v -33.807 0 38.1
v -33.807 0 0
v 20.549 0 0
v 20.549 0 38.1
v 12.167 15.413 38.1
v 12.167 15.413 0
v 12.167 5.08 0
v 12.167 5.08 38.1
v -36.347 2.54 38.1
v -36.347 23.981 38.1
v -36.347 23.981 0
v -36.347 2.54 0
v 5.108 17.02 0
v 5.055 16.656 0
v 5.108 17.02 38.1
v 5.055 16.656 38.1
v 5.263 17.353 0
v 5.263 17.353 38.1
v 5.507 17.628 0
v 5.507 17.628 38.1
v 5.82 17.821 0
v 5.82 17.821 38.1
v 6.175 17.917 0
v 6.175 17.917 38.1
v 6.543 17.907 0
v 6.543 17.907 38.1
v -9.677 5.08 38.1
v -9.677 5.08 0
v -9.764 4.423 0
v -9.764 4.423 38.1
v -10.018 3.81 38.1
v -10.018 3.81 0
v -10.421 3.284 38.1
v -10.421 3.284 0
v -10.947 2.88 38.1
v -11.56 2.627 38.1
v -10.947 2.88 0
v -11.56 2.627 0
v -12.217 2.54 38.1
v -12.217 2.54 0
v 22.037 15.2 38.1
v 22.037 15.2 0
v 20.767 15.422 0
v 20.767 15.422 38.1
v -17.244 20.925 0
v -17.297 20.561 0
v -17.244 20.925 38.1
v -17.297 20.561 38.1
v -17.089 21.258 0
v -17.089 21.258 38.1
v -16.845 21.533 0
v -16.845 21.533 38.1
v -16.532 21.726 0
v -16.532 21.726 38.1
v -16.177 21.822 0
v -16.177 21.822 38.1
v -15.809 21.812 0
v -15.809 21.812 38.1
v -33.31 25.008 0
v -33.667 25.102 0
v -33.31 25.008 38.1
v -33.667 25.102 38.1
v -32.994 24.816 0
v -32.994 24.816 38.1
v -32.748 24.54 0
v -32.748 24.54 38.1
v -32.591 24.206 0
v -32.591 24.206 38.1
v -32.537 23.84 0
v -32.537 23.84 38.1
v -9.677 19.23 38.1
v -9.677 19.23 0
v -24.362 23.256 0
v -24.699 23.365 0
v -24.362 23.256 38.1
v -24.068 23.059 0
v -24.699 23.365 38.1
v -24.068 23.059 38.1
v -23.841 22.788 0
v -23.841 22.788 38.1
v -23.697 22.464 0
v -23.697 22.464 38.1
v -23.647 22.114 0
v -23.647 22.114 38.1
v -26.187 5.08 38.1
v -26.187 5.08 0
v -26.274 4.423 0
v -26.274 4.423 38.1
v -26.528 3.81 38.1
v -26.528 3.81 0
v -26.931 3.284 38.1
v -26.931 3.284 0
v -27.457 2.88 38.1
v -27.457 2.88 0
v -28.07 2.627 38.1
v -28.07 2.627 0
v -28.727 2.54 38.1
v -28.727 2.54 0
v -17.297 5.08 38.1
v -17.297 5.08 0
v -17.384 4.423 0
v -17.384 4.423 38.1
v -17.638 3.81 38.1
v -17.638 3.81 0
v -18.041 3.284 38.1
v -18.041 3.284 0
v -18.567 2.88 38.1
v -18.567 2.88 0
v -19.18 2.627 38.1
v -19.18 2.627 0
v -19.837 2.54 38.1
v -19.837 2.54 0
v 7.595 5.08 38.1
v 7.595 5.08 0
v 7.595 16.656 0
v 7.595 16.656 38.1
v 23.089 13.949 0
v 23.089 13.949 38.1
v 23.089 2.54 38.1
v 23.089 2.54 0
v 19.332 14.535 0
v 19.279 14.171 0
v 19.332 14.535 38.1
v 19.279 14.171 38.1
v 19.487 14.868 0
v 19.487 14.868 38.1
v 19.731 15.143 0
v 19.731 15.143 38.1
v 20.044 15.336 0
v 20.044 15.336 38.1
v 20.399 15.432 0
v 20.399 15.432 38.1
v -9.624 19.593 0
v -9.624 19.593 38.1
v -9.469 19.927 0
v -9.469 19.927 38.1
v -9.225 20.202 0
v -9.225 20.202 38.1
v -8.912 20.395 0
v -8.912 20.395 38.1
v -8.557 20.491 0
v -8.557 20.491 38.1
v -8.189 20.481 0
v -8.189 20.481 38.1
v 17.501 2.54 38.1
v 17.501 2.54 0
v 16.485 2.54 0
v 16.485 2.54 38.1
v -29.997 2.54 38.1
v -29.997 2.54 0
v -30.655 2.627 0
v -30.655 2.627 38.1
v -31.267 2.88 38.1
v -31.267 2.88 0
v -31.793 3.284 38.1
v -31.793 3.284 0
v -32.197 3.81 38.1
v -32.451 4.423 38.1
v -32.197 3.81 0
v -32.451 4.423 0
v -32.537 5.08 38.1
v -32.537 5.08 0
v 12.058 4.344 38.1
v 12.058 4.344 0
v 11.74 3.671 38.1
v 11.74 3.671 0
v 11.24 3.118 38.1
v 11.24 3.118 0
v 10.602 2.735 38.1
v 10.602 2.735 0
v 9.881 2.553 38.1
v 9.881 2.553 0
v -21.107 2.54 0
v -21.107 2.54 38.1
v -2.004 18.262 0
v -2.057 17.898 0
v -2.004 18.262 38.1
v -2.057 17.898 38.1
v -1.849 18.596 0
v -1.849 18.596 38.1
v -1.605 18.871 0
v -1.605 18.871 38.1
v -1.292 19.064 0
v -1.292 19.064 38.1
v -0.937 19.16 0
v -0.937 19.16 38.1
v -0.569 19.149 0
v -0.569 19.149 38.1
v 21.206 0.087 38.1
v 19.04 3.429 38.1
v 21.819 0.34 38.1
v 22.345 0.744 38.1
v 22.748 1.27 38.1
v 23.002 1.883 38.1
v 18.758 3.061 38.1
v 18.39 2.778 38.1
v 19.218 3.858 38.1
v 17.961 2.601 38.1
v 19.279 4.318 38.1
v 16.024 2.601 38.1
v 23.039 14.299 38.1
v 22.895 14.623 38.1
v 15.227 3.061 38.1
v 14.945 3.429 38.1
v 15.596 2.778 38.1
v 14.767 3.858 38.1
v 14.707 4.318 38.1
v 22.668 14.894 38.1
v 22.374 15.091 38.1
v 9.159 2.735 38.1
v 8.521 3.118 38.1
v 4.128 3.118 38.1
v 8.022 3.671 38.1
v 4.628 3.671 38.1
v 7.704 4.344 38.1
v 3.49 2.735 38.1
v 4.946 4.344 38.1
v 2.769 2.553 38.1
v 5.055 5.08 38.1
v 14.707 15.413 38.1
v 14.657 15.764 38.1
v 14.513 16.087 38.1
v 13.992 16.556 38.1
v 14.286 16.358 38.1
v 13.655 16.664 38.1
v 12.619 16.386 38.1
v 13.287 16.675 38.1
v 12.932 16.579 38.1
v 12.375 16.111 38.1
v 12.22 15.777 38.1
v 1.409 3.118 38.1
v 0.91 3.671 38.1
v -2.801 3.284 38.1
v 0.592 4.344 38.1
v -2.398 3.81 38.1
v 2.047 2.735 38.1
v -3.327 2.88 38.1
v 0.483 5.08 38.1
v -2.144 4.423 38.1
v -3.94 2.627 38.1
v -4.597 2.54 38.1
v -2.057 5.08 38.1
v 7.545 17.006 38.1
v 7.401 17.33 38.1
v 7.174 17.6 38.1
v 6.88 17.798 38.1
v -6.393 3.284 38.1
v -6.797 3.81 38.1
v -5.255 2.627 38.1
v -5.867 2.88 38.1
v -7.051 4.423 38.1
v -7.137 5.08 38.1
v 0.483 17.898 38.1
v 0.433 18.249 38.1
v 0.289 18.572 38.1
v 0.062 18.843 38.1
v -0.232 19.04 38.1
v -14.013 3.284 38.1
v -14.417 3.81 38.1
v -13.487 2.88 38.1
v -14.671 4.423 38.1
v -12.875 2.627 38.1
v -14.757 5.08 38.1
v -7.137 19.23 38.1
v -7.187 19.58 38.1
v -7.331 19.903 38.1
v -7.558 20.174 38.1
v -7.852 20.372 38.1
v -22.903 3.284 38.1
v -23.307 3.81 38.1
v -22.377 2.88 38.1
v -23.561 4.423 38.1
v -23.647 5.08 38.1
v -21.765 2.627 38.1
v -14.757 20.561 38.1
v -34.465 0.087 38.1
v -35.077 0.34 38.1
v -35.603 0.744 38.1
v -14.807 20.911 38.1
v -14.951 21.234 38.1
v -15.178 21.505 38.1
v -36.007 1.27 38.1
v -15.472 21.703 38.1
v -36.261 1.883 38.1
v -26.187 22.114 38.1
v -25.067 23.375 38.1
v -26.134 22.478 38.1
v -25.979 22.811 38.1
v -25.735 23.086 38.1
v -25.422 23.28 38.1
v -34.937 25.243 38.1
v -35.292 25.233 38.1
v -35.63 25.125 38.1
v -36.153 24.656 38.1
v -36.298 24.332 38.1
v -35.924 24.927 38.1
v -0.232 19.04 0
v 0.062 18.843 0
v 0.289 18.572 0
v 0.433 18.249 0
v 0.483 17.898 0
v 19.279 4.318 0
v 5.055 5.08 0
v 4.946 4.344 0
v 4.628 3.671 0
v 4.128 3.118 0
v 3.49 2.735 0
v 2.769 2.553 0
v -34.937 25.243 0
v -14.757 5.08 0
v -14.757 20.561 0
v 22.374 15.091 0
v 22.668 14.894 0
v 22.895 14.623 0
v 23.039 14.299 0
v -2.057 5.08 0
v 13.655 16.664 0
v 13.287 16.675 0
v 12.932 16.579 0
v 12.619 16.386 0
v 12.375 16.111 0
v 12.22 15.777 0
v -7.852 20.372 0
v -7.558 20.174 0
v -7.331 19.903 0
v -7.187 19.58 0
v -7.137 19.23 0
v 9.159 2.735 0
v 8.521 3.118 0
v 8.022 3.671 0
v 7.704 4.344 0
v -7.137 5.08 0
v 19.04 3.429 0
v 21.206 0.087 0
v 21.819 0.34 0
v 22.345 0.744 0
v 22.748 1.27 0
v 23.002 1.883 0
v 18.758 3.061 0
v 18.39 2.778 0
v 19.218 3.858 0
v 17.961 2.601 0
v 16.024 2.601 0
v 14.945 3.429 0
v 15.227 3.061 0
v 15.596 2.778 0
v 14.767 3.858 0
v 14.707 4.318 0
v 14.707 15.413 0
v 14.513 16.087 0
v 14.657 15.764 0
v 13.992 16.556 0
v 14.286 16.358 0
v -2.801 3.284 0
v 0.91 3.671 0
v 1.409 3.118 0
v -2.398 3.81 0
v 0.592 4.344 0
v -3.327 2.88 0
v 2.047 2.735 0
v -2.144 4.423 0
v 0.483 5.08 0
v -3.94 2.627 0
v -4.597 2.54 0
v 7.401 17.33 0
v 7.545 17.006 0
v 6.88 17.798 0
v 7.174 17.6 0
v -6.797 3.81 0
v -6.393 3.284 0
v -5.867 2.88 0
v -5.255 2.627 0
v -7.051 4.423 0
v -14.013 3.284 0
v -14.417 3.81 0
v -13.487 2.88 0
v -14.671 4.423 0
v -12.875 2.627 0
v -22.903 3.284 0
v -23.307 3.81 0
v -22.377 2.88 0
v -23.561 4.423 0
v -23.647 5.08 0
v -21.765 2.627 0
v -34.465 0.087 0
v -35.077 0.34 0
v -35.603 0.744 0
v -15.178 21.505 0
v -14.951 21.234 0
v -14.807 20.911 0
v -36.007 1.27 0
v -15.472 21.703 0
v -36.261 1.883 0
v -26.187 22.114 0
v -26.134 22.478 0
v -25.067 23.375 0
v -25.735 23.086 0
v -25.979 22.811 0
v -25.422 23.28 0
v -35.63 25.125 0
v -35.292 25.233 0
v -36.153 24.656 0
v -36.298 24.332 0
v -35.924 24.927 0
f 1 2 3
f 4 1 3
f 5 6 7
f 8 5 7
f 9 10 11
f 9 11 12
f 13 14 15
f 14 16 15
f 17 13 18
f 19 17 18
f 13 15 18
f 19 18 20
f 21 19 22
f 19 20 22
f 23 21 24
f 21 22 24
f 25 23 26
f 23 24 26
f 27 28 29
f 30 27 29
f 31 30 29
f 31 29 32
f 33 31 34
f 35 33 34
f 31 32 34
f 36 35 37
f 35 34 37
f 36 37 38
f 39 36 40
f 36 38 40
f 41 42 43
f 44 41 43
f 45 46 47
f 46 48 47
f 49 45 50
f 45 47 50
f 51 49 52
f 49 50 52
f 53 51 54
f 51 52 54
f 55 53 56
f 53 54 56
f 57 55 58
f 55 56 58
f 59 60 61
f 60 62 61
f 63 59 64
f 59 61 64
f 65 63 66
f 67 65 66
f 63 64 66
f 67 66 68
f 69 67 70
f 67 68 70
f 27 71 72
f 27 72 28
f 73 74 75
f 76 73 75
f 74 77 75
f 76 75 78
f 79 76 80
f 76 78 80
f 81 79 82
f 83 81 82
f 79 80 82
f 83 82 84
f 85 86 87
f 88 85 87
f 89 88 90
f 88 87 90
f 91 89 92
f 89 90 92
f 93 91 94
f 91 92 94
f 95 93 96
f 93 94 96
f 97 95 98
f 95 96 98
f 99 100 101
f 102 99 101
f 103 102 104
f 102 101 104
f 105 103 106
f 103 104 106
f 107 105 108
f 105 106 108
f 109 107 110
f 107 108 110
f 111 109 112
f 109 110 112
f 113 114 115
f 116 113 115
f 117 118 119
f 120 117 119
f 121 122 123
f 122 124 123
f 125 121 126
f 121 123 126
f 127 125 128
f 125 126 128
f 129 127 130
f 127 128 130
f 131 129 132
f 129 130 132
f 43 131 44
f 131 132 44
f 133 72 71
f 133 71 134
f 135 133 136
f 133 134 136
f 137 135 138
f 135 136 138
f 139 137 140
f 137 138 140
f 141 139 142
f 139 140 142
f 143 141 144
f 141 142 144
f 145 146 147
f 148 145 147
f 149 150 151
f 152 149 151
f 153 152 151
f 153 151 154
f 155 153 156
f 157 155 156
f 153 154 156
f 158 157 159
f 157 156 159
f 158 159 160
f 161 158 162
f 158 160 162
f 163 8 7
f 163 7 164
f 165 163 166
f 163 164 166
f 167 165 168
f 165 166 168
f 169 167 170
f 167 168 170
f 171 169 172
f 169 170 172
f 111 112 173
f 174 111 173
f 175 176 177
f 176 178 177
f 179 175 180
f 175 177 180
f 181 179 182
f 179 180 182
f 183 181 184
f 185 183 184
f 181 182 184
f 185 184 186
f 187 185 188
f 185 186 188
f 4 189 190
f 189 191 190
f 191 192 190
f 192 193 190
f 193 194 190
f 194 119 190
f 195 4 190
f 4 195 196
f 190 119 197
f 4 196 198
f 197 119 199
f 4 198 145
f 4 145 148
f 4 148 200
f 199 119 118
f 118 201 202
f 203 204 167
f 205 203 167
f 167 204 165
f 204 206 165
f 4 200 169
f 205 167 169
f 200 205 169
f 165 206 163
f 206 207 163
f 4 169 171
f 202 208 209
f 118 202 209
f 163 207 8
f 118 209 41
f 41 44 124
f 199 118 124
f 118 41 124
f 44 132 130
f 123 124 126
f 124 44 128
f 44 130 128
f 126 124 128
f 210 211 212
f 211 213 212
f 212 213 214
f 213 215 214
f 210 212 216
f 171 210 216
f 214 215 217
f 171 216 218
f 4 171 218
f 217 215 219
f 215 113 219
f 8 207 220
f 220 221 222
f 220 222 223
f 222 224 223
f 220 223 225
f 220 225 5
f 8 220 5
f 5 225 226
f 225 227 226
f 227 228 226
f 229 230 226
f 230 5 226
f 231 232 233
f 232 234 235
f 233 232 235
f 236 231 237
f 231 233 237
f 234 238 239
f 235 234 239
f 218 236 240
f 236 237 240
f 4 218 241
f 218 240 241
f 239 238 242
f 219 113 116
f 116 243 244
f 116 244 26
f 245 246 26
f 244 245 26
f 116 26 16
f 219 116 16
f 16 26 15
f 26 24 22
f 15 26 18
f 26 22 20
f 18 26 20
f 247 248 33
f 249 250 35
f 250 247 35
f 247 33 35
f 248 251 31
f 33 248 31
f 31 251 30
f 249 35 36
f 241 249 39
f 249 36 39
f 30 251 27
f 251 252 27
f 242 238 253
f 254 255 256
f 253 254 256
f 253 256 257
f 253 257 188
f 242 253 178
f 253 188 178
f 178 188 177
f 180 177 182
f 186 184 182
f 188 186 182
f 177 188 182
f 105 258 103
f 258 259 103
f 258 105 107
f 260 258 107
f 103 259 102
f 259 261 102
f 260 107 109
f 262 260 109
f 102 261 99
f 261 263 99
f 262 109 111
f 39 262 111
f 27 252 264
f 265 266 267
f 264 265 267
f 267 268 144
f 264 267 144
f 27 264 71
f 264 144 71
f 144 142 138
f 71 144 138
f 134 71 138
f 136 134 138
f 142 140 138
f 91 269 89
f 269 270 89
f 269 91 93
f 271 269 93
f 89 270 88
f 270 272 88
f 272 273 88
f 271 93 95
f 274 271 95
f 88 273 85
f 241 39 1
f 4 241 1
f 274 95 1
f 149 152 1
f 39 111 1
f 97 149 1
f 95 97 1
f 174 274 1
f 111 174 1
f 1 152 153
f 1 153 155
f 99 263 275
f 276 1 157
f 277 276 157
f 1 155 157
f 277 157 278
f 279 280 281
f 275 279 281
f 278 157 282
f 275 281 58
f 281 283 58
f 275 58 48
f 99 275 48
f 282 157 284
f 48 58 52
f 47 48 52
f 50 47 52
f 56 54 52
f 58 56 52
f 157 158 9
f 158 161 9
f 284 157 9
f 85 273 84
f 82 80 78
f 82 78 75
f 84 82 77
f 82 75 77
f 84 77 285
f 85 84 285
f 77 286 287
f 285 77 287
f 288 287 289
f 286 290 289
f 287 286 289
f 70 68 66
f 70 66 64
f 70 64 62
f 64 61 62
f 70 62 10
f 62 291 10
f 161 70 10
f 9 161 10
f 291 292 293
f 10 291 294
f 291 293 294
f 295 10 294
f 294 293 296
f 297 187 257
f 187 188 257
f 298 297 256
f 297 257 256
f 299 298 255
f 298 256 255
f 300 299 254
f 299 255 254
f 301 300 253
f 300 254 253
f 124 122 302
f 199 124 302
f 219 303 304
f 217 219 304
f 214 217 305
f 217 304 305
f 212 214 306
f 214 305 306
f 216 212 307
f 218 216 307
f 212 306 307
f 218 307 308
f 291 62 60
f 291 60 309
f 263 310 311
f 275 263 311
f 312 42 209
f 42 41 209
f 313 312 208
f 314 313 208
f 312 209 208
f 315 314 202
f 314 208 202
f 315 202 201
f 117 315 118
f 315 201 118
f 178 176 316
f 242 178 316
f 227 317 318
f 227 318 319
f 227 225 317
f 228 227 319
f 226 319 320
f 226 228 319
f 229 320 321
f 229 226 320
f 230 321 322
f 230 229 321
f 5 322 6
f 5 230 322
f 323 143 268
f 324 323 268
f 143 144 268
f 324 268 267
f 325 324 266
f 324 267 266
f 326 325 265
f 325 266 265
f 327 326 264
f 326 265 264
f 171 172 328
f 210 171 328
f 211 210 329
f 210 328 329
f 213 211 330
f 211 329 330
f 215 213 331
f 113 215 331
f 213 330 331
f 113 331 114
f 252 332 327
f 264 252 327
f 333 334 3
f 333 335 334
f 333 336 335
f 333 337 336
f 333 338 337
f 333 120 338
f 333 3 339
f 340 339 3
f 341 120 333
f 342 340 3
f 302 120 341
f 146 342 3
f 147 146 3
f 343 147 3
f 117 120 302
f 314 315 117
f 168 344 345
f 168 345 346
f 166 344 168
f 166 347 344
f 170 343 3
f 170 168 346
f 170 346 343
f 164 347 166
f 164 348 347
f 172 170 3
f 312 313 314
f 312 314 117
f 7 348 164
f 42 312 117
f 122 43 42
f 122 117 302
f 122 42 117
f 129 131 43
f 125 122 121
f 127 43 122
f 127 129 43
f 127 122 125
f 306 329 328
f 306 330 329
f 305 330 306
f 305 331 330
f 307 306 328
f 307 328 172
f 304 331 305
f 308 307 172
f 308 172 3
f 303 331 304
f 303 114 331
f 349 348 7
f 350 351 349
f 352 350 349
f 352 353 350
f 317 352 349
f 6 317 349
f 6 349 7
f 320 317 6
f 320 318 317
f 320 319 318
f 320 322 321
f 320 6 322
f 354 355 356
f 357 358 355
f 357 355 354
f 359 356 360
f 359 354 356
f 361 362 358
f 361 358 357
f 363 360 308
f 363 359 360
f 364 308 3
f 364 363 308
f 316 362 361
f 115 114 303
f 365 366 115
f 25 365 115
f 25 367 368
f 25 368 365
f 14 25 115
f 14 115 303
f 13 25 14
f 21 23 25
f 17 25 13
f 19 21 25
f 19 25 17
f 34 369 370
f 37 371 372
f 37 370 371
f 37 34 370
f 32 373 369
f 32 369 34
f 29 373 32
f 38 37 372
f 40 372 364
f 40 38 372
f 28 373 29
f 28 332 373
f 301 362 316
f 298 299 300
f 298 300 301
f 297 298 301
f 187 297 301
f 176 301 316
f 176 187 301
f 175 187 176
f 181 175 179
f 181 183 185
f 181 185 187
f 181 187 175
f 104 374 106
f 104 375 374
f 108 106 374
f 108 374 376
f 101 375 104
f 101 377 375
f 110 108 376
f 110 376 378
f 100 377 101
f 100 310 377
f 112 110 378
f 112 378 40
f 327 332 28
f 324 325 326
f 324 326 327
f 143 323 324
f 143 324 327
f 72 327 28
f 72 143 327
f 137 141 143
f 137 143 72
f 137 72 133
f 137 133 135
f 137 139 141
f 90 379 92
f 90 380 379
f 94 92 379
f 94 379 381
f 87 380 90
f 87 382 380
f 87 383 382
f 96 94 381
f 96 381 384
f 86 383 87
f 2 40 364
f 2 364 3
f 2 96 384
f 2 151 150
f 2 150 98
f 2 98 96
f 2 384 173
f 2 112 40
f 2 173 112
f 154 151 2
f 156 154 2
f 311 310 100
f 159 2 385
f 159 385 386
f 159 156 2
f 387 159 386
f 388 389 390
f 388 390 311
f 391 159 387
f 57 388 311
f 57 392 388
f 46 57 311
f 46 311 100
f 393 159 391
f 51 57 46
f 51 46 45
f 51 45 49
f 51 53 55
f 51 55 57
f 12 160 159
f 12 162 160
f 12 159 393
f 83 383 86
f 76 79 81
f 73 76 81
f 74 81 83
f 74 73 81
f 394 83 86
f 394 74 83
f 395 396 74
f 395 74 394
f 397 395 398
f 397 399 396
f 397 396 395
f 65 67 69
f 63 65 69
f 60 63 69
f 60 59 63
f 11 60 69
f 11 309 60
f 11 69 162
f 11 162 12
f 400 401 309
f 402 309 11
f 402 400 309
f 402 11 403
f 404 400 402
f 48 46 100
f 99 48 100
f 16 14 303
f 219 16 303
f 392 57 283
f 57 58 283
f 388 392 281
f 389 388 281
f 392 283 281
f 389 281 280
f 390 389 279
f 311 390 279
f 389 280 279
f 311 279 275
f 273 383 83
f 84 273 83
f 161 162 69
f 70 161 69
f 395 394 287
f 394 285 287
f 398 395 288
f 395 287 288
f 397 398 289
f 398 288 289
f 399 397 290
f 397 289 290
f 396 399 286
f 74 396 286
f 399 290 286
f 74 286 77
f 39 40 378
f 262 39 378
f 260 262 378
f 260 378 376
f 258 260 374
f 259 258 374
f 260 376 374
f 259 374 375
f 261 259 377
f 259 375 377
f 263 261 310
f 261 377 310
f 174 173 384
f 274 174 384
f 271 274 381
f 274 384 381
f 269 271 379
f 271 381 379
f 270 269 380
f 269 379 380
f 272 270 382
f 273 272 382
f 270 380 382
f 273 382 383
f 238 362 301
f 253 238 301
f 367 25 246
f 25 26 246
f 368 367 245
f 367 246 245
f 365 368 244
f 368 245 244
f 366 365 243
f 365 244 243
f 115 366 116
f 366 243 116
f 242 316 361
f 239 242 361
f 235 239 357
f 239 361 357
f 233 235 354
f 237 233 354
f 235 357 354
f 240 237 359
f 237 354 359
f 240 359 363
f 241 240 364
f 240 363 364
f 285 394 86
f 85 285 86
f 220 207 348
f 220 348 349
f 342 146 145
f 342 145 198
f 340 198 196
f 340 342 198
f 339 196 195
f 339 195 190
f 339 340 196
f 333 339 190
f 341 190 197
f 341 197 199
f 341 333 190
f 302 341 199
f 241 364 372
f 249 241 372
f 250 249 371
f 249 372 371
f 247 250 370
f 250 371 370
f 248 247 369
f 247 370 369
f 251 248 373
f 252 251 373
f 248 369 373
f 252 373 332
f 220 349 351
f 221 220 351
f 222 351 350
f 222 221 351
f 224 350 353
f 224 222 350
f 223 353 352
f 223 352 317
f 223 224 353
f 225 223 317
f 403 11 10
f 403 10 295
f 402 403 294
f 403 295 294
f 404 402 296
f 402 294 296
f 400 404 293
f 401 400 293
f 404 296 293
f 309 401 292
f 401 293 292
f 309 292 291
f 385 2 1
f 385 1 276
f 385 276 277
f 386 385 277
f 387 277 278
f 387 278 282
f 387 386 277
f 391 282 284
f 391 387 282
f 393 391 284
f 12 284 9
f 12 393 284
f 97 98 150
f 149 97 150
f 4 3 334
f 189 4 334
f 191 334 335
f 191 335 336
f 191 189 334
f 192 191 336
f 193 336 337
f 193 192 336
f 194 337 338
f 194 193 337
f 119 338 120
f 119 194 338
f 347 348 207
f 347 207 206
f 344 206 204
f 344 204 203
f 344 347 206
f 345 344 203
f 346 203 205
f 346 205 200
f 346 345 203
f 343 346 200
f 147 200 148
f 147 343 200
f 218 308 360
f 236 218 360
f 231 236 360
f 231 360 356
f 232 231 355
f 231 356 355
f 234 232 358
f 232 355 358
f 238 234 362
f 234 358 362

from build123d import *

# Parameters (mm, degrees)
F1_DEPTH    = 38.1
F2_T1_DEPTH = 38.1
F2_T3_DEPTH = 50.8
F3_T1_DEPTH = 38.1
F4_R        = 1.26999
F5_W        = 23.6700927116
F5_H        = 11.2887102096
F6_DEPTH    = 38.101
F7_R        = 2.54


# Not quite as in the source:
# - a fillet or chamfer that OpenCascade refuses, or shapes differently, is made with other operations: its cross-section is extruded or revolved along the edge and cut away or added
# - a fillet or chamfer is up to 0.001 mm smaller than in the source, because OpenCascade refuses the exact size


with BuildPart() as f1:
    # F0 (on Top) → F1 (new body)
    with BuildSketch(Plane.XY):
        Polygon((-36.3474, 25.4), (-36.3474, 0), (36.3474, 0), (36.3474, 12.7), (32.5374, 13.3656184486), (32.5374, 2.54), (29.337, 2.54), (29.337, 13.9247379455), (26.797, 14.3684835779), (26.797, 2.54), (23.0886, 2.54), (23.0886, 15.0163522013), (19.2786, 15.6819706499), (19.2786, 2.54), (14.7066, 2.54), (14.7066, 16.4807127883), (12.1666, 16.9244584207), (12.1666, 2.54), (7.5946, 2.54), (7.5946, 17.723200559), (5.0546, 18.1669461915), (5.0546, 2.54), (0.4826, 2.54), (0.4826, 18.9656883298), (-2.0574, 19.4094339623), (-2.0574, 2.54), (-7.1374, 2.54), (-7.1374, 20.2969252271), (-9.6774, 20.7406708595), (-9.6774, 2.54), (-14.7574, 2.54), (-14.7574, 21.6281621244), (-17.2974, 22.0719077568), (-17.2974, 2.54), (-23.6474, 2.54), (-23.6474, 23.1812718379), (-26.1874, 23.6250174703), (-26.1874, 2.54), (-32.5374, 2.54), (-32.5374, 24.9766666667), align=None)
    extrude(amount=F1_DEPTH)

    # F2: fillet of radius 2.54 on 14 edges, made by hand

    # F2_s2 → F2_t1 (join)
    with BuildSketch(Plane.XY):
        with BuildLine():
            ThreePointArc((-29.9974, 2.54), (-31.7934512242, 3.2839487758), (-32.5374, 5.08))
            Line((-32.5374, 5.08), (-32.5374, 2.54))
            Line((-32.5374, 2.54), (-29.9974, 2.54))
        make_face()
        with BuildLine():
            ThreePointArc((-26.1874, 5.08), (-26.9313487758, 3.2839487758), (-28.7274, 2.54))
            Line((-28.7274, 2.54), (-26.1874, 2.54))
            Line((-26.1874, 2.54), (-26.1874, 5.08))
        make_face()
        with BuildLine():
            ThreePointArc((-21.1074, 2.54), (-22.9034512242, 3.2839487758), (-23.6474, 5.08))
            Line((-23.6474, 5.08), (-23.6474, 2.54))
            Line((-23.6474, 2.54), (-21.1074, 2.54))
        make_face()
        with BuildLine():
            ThreePointArc((-17.2974, 5.08), (-18.0413487758, 3.2839487758), (-19.8374, 2.54))
            Line((-19.8374, 2.54), (-17.2974, 2.54))
            Line((-17.2974, 2.54), (-17.2974, 5.08))
        make_face()
        with BuildLine():
            ThreePointArc((-12.2174, 2.54), (-14.0134512242, 3.2839487758), (-14.7574, 5.08))
            Line((-14.7574, 5.08), (-14.7574, 2.54))
            Line((-14.7574, 2.54), (-12.2174, 2.54))
        make_face()
        with BuildLine():
            ThreePointArc((-9.6774, 5.08), (-10.4213487758, 3.2839487758), (-12.2174, 2.54))
            Line((-12.2174, 2.54), (-9.6774, 2.54))
            Line((-9.6774, 2.54), (-9.6774, 5.08))
        make_face()
        with BuildLine():
            ThreePointArc((-4.5974, 2.54), (-6.3934512242, 3.2839487758), (-7.1374, 5.08))
            Line((-7.1374, 5.08), (-7.1374, 2.54))
            Line((-7.1374, 2.54), (-4.5974, 2.54))
        make_face()
        with BuildLine():
            ThreePointArc((-2.0574, 5.08), (-2.8013487758, 3.2839487758), (-4.5974, 2.54))
            Line((-4.5974, 2.54), (-2.0574, 2.54))
            Line((-2.0574, 2.54), (-2.0574, 5.08))
        make_face()
        with BuildLine():
            ThreePointArc((3.0226, 2.54), (1.2265487758, 3.2839487758), (0.4826, 5.08))
            Line((0.4826, 5.08), (0.4826, 2.54))
            Line((0.4826, 2.54), (3.0226, 2.54))
        make_face()
        with BuildLine():
            ThreePointArc((5.0546, 5.08), (4.3106512242, 3.2839487758), (2.5146, 2.54))
            Line((2.5146, 2.54), (5.0546, 2.54))
            Line((5.0546, 2.54), (5.0546, 5.08))
        make_face()
        with BuildLine():
            ThreePointArc((10.1346, 2.54), (8.3385487758, 3.2839487758), (7.5946, 5.08))
            Line((7.5946, 5.08), (7.5946, 2.54))
            Line((7.5946, 2.54), (10.1346, 2.54))
        make_face()
        with BuildLine():
            ThreePointArc((12.1666, 5.08), (11.4226512242, 3.2839487758), (9.6266, 2.54))
            Line((9.6266, 2.54), (12.1666, 2.54))
            Line((12.1666, 2.54), (12.1666, 5.08))
        make_face()
    extrude(amount=F2_T1_DEPTH)

    # F2_s4 → F2_t3 (cut)
    with BuildSketch(Plane.XY.offset(-6.35)):
        with BuildLine():
            ThreePointArc((-33.8074, 0), (-35.6034512242, 0.7439487758), (-36.3474, 2.54))
            Line((-36.3474, 2.54), (-36.3474, 0))
            Line((-36.3474, 0), (-33.8074, 0))
        make_face()
        with BuildLine():
            ThreePointArc((36.3474, 2.54), (35.6034512242, 0.7439487758), (33.8074, 0))
            Line((33.8074, 0), (36.3474, 0))
            Line((36.3474, 0), (36.3474, 2.54))
        make_face()
    extrude(amount=F2_T3_DEPTH, mode=Mode.SUBTRACT)

    # F3: fillet of radius 1.778 on 6 edges, made by hand

    # F3_s2 → F3_t1 (join)
    with BuildSketch(Plane.XY):
        with BuildLine():
            ThreePointArc((14.7066, 4.318), (15.2273641431, 3.0607641431), (16.4846, 2.54))
            Line((16.4846, 2.54), (14.7066, 2.54))
            Line((14.7066, 2.54), (14.7066, 4.318))
        make_face()
        with BuildLine():
            ThreePointArc((17.5006, 2.54), (18.7578358569, 3.0607641431), (19.2786, 4.318))
            Line((19.2786, 4.318), (19.2786, 2.54))
            Line((19.2786, 2.54), (17.5006, 2.54))
        make_face()
        with BuildLine():
            ThreePointArc((23.0886, 4.318), (23.6093641431, 3.0607641431), (24.8666, 2.54))
            Line((24.8666, 2.54), (23.0886, 2.54))
            Line((23.0886, 2.54), (23.0886, 4.318))
        make_face()
        with BuildLine():
            ThreePointArc((25.019, 2.54), (26.2762358569, 3.0607641431), (26.797, 4.318))
            Line((26.797, 4.318), (26.797, 2.54))
            Line((26.797, 2.54), (25.019, 2.54))
        make_face()
        with BuildLine():
            ThreePointArc((29.337, 4.318), (29.8577641431, 3.0607641431), (31.115, 2.54))
            Line((31.115, 2.54), (29.337, 2.54))
            Line((29.337, 2.54), (29.337, 4.318))
        make_face()
        with BuildLine():
            ThreePointArc((30.7594, 2.54), (32.0166358569, 3.0607641431), (32.5374, 4.318))
            Line((32.5374, 4.318), (32.5374, 2.54))
            Line((32.5374, 2.54), (30.7594, 2.54))
        make_face()
    extrude(amount=F3_T1_DEPTH)

    # F4 (radius 1.27 in the source; OpenCascade refuses exactly that, so slightly less here)
    f4_edges = [f1.edges().sort_by_distance(p)[0] for p in [
        (32.5374, 13.365618, 19.05),
        (29.337, 13.924738, 19.05),
        (26.797, 14.368484, 19.05),
        (23.0886, 15.016352, 19.05),
        (19.2786, 15.681971, 19.05),
        (14.7066, 16.480713, 19.05),
        (12.1666, 16.924458, 19.05),
        (7.5946, 17.723201, 19.05),
        (5.0546, 18.166946, 19.05),
        (0.4826, 18.965688, 19.05),
        (-2.0574, 19.409434, 19.05),
        (-7.1374, 20.296925, 19.05),
        (-14.7574, 21.628162, 19.05),
        (-23.6474, 23.181272, 19.05),
        (-26.1874, 23.625017, 19.05),
        (-32.5374, 24.976667, 19.05),
        (-36.3474, 25.4, 19.05),
        (36.3474, 12.7, 19.05),
        (-9.6774, 20.740671, 19.05),
        (-17.2974, 22.071908, 19.05),
    ]]
    fillet(f4_edges, radius=F4_R)

    # F5 (on face) → F6 (cut, through all)
    with BuildSketch(Plane.XY.offset(38.1)):
        with Locations((34.9236463558, 19.5933448658)):
            Rectangle(F5_W, F5_H)
        Polygon((46.7586927116, 13.948989761), (23.0886, 13.948989761), (23.0886, -14.5505452529), (53.0812069774, -14.5505452529), (53.0812069774, 13.948989761), align=None)
    extrude(amount=-F6_DEPTH, mode=Mode.SUBTRACT)

    # F7
    f7_edges = [f1.edges().sort_by_distance(p)[0] for p in [
        (23.0886, 0, 19.05),
    ]]
    fillet(f7_edges, radius=F7_R)


solid = f1.part
